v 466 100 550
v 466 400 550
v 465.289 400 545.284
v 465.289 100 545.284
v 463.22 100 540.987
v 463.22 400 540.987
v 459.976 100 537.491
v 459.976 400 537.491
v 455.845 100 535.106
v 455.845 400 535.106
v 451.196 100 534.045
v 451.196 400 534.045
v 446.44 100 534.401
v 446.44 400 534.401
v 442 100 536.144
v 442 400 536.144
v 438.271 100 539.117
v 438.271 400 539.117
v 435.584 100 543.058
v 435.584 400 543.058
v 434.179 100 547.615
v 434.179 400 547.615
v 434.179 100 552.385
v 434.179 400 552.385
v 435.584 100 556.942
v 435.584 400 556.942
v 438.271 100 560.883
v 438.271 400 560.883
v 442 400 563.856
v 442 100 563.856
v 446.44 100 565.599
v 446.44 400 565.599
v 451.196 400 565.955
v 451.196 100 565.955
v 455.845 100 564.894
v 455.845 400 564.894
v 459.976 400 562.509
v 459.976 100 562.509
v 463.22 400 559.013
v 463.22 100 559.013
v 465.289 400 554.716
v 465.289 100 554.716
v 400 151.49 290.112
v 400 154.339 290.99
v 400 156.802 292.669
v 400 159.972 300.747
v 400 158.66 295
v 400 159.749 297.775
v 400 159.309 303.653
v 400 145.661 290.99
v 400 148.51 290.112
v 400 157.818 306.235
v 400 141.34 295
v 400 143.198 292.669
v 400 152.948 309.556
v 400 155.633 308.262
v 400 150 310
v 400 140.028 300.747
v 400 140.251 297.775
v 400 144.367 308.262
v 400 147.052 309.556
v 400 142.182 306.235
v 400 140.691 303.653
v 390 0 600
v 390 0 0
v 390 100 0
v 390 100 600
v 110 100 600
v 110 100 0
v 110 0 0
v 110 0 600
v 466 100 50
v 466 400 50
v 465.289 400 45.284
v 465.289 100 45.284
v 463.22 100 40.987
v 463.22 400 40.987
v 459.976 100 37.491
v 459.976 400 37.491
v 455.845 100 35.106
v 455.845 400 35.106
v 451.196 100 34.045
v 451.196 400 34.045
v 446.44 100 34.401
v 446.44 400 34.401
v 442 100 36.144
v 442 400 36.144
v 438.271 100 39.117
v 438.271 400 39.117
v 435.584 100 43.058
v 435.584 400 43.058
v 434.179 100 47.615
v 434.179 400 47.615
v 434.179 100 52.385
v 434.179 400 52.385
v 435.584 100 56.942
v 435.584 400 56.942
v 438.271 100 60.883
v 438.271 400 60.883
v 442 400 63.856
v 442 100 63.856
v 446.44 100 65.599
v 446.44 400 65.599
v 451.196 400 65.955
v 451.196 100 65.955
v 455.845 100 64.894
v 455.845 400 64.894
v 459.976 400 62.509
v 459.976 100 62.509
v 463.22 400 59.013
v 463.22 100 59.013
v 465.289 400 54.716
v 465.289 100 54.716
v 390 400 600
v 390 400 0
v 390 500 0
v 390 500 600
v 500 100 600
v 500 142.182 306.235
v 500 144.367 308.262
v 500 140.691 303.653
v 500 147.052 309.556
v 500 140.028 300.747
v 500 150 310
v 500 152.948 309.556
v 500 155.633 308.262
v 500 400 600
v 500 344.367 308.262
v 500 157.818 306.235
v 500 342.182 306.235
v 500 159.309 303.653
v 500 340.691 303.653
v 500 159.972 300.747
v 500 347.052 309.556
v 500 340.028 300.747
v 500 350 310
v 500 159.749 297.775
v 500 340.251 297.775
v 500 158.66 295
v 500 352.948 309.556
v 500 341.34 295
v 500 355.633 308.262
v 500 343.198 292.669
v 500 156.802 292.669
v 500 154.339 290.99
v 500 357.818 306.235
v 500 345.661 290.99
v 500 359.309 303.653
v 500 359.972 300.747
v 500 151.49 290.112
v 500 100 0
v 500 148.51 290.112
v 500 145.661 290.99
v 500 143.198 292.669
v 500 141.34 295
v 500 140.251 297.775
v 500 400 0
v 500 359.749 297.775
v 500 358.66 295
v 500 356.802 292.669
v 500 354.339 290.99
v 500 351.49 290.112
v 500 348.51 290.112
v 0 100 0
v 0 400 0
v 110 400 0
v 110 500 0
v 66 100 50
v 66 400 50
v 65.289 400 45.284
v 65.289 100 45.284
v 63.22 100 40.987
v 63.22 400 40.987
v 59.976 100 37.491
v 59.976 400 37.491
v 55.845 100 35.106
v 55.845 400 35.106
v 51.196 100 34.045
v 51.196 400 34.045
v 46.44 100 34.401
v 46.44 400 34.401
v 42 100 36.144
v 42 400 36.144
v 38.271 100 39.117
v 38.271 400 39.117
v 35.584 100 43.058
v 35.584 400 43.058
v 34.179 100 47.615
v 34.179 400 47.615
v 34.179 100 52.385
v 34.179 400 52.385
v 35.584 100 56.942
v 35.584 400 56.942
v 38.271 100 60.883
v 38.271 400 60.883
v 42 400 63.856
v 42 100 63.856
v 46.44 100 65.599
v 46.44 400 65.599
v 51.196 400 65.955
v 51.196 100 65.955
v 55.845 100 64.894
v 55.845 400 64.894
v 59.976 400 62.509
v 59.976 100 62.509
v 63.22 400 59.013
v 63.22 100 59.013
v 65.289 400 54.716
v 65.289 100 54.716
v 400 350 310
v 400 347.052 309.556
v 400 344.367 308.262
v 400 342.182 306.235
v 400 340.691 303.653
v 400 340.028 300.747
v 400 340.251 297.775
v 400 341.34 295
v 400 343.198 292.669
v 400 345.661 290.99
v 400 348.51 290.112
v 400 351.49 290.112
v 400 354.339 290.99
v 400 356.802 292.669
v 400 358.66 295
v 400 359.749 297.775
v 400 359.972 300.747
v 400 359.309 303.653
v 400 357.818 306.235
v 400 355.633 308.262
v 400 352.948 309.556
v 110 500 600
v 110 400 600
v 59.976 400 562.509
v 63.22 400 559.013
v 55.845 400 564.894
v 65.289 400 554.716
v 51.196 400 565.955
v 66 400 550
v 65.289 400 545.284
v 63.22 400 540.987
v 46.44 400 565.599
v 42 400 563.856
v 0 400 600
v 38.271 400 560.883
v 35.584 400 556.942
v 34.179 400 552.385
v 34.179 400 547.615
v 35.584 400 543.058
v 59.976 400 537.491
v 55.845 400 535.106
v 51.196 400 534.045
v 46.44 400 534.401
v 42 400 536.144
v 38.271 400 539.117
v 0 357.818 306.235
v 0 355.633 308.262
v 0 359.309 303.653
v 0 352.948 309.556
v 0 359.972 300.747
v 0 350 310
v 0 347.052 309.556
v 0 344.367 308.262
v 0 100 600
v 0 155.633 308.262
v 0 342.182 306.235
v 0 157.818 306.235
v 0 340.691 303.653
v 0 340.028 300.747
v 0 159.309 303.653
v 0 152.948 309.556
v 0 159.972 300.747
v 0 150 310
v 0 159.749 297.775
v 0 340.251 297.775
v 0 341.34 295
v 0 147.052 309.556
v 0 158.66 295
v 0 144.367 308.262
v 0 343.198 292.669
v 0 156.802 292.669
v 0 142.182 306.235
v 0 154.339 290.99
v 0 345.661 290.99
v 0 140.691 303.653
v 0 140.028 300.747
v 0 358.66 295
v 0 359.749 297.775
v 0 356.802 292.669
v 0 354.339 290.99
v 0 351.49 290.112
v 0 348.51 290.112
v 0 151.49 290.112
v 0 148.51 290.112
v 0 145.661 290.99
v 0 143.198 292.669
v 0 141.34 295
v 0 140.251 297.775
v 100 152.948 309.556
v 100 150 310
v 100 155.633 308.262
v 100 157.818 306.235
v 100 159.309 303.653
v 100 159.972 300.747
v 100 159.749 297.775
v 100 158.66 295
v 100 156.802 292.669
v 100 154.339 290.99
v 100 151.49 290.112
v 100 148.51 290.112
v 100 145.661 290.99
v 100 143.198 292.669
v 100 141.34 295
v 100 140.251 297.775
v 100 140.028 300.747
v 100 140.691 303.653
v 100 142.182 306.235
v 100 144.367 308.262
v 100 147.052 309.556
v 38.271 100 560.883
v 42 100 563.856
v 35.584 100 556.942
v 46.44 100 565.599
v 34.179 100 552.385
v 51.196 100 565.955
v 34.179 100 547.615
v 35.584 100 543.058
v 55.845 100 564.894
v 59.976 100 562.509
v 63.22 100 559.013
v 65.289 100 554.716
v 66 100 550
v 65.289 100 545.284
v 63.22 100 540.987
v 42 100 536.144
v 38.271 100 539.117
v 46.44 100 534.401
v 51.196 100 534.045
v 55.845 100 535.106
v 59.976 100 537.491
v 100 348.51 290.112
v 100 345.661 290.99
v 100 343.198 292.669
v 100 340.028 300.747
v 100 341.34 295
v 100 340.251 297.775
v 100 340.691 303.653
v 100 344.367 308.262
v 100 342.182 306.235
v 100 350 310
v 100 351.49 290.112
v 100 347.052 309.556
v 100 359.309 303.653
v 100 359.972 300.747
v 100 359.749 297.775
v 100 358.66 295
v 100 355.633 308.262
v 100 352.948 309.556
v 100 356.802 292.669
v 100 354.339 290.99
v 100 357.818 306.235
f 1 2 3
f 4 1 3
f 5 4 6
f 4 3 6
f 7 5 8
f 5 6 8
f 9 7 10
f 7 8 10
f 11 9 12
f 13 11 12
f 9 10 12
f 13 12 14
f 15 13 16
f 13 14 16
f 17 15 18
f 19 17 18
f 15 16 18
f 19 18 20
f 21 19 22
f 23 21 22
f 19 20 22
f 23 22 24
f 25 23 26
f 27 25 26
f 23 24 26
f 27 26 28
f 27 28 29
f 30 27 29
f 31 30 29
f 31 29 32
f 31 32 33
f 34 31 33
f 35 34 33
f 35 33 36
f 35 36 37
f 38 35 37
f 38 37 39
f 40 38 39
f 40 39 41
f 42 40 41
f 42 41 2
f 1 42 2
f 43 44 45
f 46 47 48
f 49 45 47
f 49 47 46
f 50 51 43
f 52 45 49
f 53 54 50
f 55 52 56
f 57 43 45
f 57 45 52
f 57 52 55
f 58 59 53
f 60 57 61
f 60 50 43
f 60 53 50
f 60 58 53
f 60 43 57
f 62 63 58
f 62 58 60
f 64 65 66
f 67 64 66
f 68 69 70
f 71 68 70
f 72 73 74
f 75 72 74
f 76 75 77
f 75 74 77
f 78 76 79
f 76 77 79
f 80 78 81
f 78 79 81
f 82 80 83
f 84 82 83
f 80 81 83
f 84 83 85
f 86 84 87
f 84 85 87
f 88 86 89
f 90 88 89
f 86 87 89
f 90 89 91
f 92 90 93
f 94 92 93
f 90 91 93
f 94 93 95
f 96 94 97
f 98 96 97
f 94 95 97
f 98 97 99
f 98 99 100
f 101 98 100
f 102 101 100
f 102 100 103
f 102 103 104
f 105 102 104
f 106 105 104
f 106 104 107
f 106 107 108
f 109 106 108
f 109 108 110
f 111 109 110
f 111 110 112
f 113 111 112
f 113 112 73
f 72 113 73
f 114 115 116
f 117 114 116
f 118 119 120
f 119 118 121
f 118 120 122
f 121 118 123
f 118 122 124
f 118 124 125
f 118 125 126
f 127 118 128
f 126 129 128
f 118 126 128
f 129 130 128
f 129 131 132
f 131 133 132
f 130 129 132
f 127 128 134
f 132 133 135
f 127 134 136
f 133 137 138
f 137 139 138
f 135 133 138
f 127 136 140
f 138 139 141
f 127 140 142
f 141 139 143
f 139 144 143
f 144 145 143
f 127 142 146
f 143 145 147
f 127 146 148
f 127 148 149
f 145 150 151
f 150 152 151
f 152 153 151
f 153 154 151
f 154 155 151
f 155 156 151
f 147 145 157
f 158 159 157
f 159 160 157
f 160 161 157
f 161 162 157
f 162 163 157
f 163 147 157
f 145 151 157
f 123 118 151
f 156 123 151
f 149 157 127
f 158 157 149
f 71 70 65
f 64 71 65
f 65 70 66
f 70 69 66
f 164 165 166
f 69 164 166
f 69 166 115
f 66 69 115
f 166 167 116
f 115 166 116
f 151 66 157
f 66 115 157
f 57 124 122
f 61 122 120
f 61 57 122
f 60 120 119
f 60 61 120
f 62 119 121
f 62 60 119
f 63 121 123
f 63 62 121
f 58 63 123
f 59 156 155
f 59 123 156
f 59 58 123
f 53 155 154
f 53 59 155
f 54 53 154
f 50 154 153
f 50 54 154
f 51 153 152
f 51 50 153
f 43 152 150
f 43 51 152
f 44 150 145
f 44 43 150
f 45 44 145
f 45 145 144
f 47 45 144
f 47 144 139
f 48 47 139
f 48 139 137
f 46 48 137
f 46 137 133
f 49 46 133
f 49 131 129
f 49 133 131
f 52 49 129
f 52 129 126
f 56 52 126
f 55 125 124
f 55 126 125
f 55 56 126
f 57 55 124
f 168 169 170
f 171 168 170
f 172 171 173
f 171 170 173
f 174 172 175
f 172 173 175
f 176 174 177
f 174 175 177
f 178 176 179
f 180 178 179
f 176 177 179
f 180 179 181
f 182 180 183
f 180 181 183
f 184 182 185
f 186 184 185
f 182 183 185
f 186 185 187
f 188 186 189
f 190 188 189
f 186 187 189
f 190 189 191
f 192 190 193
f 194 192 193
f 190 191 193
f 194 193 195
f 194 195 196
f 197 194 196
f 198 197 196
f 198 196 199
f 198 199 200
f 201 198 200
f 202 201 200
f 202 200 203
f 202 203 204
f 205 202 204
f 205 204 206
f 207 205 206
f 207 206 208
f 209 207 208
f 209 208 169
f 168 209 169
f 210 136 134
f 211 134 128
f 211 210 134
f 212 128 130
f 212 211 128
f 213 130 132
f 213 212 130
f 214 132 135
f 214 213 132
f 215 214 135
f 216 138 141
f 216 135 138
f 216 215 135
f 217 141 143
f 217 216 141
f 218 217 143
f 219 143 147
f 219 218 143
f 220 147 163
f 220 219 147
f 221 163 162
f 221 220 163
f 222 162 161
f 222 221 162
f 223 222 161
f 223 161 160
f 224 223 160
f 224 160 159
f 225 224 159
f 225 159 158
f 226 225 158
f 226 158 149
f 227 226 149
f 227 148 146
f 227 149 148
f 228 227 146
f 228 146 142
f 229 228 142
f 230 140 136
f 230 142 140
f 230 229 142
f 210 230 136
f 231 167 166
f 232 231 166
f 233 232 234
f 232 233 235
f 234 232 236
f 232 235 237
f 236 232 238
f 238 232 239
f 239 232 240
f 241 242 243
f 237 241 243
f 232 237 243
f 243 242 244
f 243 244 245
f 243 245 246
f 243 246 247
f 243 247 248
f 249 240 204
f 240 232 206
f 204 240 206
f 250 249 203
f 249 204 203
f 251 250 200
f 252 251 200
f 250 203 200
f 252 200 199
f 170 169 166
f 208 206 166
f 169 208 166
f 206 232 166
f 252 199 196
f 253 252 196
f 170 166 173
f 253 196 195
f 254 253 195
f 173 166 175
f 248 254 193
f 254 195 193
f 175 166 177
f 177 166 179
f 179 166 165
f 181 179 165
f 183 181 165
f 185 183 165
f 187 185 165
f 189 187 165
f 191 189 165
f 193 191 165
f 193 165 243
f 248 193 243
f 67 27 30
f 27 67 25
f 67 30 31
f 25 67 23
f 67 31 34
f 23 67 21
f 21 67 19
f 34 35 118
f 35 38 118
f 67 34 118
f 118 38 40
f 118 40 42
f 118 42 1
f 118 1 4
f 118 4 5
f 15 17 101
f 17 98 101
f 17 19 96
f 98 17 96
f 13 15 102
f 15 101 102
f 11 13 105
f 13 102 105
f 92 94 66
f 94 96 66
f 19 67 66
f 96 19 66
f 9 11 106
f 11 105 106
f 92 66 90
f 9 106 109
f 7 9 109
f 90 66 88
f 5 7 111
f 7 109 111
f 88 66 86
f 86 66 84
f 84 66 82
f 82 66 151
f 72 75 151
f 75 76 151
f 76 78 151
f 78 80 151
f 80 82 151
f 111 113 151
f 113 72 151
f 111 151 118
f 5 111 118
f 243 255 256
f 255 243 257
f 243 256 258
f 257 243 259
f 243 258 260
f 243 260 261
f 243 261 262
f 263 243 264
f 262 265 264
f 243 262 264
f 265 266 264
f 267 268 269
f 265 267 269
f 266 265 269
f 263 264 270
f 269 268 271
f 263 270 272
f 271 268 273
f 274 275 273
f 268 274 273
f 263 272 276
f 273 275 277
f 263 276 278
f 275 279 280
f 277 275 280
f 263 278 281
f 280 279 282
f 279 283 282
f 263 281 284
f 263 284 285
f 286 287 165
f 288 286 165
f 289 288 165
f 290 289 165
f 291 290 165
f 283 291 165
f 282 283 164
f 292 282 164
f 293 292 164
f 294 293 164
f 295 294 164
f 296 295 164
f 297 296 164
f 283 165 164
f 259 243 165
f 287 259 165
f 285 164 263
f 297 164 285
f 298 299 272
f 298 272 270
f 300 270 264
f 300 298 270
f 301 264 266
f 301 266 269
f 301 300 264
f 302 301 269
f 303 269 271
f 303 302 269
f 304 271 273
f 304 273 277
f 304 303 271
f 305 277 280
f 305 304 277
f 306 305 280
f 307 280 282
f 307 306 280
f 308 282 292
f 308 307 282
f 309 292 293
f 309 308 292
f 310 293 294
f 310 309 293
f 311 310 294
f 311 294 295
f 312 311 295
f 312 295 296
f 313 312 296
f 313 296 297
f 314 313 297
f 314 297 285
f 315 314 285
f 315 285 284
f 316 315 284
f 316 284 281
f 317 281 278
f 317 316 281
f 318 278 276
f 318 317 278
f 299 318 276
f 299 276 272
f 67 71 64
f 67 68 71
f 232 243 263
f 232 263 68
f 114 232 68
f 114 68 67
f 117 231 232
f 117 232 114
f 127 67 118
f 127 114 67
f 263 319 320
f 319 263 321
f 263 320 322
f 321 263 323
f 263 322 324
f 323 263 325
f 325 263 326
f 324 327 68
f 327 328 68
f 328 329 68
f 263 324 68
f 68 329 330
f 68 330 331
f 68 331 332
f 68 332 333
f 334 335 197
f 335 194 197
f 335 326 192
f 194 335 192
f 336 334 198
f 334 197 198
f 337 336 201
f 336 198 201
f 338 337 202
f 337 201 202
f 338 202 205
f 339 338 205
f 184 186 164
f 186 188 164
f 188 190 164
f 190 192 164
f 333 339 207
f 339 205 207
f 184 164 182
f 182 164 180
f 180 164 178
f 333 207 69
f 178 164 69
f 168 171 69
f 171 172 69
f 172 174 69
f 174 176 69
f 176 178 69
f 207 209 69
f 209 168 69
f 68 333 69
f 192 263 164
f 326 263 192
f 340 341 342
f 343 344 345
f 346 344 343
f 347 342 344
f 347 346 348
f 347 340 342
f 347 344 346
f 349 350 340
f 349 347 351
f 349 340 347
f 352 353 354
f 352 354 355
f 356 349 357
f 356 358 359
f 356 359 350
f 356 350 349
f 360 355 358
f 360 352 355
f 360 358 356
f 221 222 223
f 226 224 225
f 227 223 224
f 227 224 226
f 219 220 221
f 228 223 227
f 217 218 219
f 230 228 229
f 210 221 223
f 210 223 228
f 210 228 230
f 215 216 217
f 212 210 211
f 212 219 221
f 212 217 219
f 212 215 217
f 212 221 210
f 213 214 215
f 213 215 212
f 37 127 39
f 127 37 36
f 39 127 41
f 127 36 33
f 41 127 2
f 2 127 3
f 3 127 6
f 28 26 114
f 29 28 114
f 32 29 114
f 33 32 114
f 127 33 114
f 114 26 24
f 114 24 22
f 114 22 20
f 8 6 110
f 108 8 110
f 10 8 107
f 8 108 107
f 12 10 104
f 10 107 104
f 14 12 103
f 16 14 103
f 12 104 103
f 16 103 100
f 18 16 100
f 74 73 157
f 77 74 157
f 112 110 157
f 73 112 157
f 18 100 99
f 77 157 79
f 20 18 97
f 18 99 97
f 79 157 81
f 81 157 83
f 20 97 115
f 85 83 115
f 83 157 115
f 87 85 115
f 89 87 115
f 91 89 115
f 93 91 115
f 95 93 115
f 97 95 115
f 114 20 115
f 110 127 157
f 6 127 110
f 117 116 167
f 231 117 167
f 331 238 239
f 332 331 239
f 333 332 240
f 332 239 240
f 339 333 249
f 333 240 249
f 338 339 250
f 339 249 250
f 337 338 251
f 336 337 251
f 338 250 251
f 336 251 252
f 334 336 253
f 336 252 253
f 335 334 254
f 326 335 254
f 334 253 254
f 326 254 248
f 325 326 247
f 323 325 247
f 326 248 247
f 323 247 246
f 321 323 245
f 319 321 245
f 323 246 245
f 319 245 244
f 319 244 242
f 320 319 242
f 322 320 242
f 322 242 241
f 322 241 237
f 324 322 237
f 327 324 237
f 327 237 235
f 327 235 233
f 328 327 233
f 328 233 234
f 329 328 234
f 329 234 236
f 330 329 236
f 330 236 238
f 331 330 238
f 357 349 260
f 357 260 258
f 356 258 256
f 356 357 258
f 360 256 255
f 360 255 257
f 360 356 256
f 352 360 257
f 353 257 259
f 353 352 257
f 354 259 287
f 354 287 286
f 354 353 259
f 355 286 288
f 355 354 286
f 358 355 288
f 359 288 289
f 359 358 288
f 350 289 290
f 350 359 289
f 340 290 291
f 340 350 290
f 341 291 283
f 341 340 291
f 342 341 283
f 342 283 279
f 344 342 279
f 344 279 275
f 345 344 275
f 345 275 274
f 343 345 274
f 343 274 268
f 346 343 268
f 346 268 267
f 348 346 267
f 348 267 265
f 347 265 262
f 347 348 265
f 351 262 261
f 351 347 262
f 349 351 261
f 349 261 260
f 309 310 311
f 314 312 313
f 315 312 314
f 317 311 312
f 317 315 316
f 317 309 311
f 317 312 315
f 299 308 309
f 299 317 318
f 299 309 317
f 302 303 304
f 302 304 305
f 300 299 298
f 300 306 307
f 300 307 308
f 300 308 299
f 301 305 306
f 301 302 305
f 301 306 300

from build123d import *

# Parameters (mm, degrees)
BOSS_EXTRUDE1_DEPTH     = 600
M36_TAPPED_HOLE1_D      = 32
CUT_EXTRUDE1_DEPTH      = 928.36184955
CUT_EXTRUDE1_DEPTH_BACK = 100
SKETCH6_R               = 10
CUT_EXTRUDE2_START      = -100
SKETCH7_R               = 10
CUT_EXTRUDE2_DEPTH      = 100


with BuildPart() as part:
    # Sketch1 → Boss-Extrude1 (new body)
    with BuildSketch(Plane.XY):
        Polygon((110, 0), (390, 0), (390, 100), (500, 100), (500, 400), (390, 400), (390, 500), (110, 500), (110, 400), (0, 400), (0, 100), (110, 100), align=None)
    extrude(amount=BOSS_EXTRUDE1_DEPTH)

    # M36 Tapped Hole1 (through all)
    with Locations(Plane(origin=(0, 100, 0), x_dir=(-1, 0, 0), z_dir=(0, -1, 0))):
        with Locations((-50, -50), (-50, -550), (-450, -50), (-450, -550)):
            Hole(M36_TAPPED_HOLE1_D / 2)

    # Sketch6 → Cut-Extrude1 (cut, two sides: drawn at the far end of the back side and taken through both)
    with BuildSketch(Plane(origin=(500, 0, 0), x_dir=(0, 0, -1), z_dir=(1, 0, 0)).offset(-CUT_EXTRUDE1_DEPTH_BACK)):
        with Locations(Location((-300, 150, 0), (0, 0, 180))):
            Circle(SKETCH6_R)
        with Locations(Location((-300, 350, 0), (0, 0, 180))):
            Circle(SKETCH6_R)
    extrude(amount=CUT_EXTRUDE1_DEPTH + CUT_EXTRUDE1_DEPTH_BACK, mode=Mode.SUBTRACT)

    # Sketch7 → Cut-Extrude2 (cut)
    with BuildSketch(Plane.ZY.offset(CUT_EXTRUDE2_START)):
        with Locations((300, 150)):
            Circle(SKETCH7_R)
        with Locations((300, 350)):
            Circle(SKETCH7_R)
    extrude(amount=CUT_EXTRUDE2_DEPTH, mode=Mode.SUBTRACT)


solid = part.part
